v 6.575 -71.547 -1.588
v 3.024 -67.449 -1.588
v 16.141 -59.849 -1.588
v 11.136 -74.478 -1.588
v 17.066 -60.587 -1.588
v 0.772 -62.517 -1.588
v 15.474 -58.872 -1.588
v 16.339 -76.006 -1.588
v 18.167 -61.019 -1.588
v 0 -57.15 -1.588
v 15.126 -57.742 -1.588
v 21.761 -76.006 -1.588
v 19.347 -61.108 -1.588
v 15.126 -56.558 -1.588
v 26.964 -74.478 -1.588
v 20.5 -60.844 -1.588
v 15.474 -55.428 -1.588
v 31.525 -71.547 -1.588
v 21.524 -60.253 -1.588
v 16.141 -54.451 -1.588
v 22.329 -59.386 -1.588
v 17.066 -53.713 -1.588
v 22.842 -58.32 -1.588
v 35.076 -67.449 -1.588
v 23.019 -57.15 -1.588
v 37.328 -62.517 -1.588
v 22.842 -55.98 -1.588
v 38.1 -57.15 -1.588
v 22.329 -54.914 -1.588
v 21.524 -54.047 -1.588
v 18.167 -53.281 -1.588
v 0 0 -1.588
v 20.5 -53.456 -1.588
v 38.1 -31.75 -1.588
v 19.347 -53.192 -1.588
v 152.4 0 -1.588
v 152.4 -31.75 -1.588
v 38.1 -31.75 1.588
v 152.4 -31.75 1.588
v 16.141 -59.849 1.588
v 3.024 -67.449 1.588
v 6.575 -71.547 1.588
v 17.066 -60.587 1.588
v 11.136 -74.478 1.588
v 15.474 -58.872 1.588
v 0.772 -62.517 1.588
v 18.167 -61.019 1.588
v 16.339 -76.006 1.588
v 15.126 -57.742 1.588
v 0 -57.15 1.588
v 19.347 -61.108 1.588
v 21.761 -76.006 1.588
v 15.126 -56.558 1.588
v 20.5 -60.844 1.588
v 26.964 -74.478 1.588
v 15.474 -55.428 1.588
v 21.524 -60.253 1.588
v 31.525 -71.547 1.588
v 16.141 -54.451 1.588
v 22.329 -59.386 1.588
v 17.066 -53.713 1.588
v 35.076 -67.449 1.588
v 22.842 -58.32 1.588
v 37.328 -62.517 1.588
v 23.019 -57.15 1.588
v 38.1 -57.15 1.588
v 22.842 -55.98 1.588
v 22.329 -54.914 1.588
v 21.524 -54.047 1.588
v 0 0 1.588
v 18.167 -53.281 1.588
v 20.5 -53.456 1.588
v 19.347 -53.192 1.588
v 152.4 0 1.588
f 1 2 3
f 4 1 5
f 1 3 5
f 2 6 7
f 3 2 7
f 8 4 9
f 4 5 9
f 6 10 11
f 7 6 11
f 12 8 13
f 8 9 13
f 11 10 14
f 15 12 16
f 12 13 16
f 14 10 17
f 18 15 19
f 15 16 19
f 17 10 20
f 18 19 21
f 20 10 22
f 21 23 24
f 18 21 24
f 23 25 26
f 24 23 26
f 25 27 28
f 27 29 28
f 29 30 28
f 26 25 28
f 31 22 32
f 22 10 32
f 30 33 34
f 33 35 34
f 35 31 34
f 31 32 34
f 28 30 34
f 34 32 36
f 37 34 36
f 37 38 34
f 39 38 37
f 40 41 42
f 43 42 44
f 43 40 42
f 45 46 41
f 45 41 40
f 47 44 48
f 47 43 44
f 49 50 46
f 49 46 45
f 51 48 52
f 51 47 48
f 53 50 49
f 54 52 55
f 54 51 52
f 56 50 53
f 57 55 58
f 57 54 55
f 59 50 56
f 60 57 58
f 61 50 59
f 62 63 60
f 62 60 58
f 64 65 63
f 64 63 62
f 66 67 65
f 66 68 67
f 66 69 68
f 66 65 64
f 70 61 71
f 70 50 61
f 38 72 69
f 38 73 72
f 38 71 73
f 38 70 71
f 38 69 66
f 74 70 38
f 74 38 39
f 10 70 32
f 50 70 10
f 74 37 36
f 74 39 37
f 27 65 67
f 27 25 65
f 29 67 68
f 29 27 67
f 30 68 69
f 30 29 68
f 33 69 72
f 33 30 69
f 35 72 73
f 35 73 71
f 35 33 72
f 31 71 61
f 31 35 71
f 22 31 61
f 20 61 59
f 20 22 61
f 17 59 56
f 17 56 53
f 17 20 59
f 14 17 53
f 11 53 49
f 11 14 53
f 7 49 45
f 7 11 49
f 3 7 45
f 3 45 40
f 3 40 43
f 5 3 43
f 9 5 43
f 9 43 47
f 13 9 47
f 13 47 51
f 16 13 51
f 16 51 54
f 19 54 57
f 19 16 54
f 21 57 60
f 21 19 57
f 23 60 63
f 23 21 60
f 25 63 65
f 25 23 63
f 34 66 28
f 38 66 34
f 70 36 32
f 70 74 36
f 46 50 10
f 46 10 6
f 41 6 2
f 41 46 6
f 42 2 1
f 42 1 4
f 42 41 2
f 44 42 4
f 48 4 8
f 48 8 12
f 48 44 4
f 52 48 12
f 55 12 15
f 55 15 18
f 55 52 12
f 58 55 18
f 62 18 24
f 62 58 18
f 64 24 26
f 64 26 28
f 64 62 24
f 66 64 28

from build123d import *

# Parameters (mm, degrees)
SKETCH1_R           = 3.96875
BOSS_EXTRUDE1_DEPTH = 1.5875


with BuildPart() as part:
    # Sketch1 → Boss-Extrude1 (new body, symmetric)
    with BuildSketch(Plane.XY):
        with BuildLine():
            Line((0, 0), (0, -57.15))
            ThreePointArc((0, -57.15), (19.05, -76.2), (38.1, -57.15))
            Line((38.1, -57.15), (38.1, -31.75))
            Line((38.1, -31.75), (152.4, -31.75))
            Line((152.4, -31.75), (152.4, 0))
            Line((152.4, 0), (0, 0))
        make_face()
        with Locations((19.05, -57.15)):
            Circle(SKETCH1_R, mode=Mode.SUBTRACT)
    extrude(amount=BOSS_EXTRUDE1_DEPTH, both=True)


solid = part.part
